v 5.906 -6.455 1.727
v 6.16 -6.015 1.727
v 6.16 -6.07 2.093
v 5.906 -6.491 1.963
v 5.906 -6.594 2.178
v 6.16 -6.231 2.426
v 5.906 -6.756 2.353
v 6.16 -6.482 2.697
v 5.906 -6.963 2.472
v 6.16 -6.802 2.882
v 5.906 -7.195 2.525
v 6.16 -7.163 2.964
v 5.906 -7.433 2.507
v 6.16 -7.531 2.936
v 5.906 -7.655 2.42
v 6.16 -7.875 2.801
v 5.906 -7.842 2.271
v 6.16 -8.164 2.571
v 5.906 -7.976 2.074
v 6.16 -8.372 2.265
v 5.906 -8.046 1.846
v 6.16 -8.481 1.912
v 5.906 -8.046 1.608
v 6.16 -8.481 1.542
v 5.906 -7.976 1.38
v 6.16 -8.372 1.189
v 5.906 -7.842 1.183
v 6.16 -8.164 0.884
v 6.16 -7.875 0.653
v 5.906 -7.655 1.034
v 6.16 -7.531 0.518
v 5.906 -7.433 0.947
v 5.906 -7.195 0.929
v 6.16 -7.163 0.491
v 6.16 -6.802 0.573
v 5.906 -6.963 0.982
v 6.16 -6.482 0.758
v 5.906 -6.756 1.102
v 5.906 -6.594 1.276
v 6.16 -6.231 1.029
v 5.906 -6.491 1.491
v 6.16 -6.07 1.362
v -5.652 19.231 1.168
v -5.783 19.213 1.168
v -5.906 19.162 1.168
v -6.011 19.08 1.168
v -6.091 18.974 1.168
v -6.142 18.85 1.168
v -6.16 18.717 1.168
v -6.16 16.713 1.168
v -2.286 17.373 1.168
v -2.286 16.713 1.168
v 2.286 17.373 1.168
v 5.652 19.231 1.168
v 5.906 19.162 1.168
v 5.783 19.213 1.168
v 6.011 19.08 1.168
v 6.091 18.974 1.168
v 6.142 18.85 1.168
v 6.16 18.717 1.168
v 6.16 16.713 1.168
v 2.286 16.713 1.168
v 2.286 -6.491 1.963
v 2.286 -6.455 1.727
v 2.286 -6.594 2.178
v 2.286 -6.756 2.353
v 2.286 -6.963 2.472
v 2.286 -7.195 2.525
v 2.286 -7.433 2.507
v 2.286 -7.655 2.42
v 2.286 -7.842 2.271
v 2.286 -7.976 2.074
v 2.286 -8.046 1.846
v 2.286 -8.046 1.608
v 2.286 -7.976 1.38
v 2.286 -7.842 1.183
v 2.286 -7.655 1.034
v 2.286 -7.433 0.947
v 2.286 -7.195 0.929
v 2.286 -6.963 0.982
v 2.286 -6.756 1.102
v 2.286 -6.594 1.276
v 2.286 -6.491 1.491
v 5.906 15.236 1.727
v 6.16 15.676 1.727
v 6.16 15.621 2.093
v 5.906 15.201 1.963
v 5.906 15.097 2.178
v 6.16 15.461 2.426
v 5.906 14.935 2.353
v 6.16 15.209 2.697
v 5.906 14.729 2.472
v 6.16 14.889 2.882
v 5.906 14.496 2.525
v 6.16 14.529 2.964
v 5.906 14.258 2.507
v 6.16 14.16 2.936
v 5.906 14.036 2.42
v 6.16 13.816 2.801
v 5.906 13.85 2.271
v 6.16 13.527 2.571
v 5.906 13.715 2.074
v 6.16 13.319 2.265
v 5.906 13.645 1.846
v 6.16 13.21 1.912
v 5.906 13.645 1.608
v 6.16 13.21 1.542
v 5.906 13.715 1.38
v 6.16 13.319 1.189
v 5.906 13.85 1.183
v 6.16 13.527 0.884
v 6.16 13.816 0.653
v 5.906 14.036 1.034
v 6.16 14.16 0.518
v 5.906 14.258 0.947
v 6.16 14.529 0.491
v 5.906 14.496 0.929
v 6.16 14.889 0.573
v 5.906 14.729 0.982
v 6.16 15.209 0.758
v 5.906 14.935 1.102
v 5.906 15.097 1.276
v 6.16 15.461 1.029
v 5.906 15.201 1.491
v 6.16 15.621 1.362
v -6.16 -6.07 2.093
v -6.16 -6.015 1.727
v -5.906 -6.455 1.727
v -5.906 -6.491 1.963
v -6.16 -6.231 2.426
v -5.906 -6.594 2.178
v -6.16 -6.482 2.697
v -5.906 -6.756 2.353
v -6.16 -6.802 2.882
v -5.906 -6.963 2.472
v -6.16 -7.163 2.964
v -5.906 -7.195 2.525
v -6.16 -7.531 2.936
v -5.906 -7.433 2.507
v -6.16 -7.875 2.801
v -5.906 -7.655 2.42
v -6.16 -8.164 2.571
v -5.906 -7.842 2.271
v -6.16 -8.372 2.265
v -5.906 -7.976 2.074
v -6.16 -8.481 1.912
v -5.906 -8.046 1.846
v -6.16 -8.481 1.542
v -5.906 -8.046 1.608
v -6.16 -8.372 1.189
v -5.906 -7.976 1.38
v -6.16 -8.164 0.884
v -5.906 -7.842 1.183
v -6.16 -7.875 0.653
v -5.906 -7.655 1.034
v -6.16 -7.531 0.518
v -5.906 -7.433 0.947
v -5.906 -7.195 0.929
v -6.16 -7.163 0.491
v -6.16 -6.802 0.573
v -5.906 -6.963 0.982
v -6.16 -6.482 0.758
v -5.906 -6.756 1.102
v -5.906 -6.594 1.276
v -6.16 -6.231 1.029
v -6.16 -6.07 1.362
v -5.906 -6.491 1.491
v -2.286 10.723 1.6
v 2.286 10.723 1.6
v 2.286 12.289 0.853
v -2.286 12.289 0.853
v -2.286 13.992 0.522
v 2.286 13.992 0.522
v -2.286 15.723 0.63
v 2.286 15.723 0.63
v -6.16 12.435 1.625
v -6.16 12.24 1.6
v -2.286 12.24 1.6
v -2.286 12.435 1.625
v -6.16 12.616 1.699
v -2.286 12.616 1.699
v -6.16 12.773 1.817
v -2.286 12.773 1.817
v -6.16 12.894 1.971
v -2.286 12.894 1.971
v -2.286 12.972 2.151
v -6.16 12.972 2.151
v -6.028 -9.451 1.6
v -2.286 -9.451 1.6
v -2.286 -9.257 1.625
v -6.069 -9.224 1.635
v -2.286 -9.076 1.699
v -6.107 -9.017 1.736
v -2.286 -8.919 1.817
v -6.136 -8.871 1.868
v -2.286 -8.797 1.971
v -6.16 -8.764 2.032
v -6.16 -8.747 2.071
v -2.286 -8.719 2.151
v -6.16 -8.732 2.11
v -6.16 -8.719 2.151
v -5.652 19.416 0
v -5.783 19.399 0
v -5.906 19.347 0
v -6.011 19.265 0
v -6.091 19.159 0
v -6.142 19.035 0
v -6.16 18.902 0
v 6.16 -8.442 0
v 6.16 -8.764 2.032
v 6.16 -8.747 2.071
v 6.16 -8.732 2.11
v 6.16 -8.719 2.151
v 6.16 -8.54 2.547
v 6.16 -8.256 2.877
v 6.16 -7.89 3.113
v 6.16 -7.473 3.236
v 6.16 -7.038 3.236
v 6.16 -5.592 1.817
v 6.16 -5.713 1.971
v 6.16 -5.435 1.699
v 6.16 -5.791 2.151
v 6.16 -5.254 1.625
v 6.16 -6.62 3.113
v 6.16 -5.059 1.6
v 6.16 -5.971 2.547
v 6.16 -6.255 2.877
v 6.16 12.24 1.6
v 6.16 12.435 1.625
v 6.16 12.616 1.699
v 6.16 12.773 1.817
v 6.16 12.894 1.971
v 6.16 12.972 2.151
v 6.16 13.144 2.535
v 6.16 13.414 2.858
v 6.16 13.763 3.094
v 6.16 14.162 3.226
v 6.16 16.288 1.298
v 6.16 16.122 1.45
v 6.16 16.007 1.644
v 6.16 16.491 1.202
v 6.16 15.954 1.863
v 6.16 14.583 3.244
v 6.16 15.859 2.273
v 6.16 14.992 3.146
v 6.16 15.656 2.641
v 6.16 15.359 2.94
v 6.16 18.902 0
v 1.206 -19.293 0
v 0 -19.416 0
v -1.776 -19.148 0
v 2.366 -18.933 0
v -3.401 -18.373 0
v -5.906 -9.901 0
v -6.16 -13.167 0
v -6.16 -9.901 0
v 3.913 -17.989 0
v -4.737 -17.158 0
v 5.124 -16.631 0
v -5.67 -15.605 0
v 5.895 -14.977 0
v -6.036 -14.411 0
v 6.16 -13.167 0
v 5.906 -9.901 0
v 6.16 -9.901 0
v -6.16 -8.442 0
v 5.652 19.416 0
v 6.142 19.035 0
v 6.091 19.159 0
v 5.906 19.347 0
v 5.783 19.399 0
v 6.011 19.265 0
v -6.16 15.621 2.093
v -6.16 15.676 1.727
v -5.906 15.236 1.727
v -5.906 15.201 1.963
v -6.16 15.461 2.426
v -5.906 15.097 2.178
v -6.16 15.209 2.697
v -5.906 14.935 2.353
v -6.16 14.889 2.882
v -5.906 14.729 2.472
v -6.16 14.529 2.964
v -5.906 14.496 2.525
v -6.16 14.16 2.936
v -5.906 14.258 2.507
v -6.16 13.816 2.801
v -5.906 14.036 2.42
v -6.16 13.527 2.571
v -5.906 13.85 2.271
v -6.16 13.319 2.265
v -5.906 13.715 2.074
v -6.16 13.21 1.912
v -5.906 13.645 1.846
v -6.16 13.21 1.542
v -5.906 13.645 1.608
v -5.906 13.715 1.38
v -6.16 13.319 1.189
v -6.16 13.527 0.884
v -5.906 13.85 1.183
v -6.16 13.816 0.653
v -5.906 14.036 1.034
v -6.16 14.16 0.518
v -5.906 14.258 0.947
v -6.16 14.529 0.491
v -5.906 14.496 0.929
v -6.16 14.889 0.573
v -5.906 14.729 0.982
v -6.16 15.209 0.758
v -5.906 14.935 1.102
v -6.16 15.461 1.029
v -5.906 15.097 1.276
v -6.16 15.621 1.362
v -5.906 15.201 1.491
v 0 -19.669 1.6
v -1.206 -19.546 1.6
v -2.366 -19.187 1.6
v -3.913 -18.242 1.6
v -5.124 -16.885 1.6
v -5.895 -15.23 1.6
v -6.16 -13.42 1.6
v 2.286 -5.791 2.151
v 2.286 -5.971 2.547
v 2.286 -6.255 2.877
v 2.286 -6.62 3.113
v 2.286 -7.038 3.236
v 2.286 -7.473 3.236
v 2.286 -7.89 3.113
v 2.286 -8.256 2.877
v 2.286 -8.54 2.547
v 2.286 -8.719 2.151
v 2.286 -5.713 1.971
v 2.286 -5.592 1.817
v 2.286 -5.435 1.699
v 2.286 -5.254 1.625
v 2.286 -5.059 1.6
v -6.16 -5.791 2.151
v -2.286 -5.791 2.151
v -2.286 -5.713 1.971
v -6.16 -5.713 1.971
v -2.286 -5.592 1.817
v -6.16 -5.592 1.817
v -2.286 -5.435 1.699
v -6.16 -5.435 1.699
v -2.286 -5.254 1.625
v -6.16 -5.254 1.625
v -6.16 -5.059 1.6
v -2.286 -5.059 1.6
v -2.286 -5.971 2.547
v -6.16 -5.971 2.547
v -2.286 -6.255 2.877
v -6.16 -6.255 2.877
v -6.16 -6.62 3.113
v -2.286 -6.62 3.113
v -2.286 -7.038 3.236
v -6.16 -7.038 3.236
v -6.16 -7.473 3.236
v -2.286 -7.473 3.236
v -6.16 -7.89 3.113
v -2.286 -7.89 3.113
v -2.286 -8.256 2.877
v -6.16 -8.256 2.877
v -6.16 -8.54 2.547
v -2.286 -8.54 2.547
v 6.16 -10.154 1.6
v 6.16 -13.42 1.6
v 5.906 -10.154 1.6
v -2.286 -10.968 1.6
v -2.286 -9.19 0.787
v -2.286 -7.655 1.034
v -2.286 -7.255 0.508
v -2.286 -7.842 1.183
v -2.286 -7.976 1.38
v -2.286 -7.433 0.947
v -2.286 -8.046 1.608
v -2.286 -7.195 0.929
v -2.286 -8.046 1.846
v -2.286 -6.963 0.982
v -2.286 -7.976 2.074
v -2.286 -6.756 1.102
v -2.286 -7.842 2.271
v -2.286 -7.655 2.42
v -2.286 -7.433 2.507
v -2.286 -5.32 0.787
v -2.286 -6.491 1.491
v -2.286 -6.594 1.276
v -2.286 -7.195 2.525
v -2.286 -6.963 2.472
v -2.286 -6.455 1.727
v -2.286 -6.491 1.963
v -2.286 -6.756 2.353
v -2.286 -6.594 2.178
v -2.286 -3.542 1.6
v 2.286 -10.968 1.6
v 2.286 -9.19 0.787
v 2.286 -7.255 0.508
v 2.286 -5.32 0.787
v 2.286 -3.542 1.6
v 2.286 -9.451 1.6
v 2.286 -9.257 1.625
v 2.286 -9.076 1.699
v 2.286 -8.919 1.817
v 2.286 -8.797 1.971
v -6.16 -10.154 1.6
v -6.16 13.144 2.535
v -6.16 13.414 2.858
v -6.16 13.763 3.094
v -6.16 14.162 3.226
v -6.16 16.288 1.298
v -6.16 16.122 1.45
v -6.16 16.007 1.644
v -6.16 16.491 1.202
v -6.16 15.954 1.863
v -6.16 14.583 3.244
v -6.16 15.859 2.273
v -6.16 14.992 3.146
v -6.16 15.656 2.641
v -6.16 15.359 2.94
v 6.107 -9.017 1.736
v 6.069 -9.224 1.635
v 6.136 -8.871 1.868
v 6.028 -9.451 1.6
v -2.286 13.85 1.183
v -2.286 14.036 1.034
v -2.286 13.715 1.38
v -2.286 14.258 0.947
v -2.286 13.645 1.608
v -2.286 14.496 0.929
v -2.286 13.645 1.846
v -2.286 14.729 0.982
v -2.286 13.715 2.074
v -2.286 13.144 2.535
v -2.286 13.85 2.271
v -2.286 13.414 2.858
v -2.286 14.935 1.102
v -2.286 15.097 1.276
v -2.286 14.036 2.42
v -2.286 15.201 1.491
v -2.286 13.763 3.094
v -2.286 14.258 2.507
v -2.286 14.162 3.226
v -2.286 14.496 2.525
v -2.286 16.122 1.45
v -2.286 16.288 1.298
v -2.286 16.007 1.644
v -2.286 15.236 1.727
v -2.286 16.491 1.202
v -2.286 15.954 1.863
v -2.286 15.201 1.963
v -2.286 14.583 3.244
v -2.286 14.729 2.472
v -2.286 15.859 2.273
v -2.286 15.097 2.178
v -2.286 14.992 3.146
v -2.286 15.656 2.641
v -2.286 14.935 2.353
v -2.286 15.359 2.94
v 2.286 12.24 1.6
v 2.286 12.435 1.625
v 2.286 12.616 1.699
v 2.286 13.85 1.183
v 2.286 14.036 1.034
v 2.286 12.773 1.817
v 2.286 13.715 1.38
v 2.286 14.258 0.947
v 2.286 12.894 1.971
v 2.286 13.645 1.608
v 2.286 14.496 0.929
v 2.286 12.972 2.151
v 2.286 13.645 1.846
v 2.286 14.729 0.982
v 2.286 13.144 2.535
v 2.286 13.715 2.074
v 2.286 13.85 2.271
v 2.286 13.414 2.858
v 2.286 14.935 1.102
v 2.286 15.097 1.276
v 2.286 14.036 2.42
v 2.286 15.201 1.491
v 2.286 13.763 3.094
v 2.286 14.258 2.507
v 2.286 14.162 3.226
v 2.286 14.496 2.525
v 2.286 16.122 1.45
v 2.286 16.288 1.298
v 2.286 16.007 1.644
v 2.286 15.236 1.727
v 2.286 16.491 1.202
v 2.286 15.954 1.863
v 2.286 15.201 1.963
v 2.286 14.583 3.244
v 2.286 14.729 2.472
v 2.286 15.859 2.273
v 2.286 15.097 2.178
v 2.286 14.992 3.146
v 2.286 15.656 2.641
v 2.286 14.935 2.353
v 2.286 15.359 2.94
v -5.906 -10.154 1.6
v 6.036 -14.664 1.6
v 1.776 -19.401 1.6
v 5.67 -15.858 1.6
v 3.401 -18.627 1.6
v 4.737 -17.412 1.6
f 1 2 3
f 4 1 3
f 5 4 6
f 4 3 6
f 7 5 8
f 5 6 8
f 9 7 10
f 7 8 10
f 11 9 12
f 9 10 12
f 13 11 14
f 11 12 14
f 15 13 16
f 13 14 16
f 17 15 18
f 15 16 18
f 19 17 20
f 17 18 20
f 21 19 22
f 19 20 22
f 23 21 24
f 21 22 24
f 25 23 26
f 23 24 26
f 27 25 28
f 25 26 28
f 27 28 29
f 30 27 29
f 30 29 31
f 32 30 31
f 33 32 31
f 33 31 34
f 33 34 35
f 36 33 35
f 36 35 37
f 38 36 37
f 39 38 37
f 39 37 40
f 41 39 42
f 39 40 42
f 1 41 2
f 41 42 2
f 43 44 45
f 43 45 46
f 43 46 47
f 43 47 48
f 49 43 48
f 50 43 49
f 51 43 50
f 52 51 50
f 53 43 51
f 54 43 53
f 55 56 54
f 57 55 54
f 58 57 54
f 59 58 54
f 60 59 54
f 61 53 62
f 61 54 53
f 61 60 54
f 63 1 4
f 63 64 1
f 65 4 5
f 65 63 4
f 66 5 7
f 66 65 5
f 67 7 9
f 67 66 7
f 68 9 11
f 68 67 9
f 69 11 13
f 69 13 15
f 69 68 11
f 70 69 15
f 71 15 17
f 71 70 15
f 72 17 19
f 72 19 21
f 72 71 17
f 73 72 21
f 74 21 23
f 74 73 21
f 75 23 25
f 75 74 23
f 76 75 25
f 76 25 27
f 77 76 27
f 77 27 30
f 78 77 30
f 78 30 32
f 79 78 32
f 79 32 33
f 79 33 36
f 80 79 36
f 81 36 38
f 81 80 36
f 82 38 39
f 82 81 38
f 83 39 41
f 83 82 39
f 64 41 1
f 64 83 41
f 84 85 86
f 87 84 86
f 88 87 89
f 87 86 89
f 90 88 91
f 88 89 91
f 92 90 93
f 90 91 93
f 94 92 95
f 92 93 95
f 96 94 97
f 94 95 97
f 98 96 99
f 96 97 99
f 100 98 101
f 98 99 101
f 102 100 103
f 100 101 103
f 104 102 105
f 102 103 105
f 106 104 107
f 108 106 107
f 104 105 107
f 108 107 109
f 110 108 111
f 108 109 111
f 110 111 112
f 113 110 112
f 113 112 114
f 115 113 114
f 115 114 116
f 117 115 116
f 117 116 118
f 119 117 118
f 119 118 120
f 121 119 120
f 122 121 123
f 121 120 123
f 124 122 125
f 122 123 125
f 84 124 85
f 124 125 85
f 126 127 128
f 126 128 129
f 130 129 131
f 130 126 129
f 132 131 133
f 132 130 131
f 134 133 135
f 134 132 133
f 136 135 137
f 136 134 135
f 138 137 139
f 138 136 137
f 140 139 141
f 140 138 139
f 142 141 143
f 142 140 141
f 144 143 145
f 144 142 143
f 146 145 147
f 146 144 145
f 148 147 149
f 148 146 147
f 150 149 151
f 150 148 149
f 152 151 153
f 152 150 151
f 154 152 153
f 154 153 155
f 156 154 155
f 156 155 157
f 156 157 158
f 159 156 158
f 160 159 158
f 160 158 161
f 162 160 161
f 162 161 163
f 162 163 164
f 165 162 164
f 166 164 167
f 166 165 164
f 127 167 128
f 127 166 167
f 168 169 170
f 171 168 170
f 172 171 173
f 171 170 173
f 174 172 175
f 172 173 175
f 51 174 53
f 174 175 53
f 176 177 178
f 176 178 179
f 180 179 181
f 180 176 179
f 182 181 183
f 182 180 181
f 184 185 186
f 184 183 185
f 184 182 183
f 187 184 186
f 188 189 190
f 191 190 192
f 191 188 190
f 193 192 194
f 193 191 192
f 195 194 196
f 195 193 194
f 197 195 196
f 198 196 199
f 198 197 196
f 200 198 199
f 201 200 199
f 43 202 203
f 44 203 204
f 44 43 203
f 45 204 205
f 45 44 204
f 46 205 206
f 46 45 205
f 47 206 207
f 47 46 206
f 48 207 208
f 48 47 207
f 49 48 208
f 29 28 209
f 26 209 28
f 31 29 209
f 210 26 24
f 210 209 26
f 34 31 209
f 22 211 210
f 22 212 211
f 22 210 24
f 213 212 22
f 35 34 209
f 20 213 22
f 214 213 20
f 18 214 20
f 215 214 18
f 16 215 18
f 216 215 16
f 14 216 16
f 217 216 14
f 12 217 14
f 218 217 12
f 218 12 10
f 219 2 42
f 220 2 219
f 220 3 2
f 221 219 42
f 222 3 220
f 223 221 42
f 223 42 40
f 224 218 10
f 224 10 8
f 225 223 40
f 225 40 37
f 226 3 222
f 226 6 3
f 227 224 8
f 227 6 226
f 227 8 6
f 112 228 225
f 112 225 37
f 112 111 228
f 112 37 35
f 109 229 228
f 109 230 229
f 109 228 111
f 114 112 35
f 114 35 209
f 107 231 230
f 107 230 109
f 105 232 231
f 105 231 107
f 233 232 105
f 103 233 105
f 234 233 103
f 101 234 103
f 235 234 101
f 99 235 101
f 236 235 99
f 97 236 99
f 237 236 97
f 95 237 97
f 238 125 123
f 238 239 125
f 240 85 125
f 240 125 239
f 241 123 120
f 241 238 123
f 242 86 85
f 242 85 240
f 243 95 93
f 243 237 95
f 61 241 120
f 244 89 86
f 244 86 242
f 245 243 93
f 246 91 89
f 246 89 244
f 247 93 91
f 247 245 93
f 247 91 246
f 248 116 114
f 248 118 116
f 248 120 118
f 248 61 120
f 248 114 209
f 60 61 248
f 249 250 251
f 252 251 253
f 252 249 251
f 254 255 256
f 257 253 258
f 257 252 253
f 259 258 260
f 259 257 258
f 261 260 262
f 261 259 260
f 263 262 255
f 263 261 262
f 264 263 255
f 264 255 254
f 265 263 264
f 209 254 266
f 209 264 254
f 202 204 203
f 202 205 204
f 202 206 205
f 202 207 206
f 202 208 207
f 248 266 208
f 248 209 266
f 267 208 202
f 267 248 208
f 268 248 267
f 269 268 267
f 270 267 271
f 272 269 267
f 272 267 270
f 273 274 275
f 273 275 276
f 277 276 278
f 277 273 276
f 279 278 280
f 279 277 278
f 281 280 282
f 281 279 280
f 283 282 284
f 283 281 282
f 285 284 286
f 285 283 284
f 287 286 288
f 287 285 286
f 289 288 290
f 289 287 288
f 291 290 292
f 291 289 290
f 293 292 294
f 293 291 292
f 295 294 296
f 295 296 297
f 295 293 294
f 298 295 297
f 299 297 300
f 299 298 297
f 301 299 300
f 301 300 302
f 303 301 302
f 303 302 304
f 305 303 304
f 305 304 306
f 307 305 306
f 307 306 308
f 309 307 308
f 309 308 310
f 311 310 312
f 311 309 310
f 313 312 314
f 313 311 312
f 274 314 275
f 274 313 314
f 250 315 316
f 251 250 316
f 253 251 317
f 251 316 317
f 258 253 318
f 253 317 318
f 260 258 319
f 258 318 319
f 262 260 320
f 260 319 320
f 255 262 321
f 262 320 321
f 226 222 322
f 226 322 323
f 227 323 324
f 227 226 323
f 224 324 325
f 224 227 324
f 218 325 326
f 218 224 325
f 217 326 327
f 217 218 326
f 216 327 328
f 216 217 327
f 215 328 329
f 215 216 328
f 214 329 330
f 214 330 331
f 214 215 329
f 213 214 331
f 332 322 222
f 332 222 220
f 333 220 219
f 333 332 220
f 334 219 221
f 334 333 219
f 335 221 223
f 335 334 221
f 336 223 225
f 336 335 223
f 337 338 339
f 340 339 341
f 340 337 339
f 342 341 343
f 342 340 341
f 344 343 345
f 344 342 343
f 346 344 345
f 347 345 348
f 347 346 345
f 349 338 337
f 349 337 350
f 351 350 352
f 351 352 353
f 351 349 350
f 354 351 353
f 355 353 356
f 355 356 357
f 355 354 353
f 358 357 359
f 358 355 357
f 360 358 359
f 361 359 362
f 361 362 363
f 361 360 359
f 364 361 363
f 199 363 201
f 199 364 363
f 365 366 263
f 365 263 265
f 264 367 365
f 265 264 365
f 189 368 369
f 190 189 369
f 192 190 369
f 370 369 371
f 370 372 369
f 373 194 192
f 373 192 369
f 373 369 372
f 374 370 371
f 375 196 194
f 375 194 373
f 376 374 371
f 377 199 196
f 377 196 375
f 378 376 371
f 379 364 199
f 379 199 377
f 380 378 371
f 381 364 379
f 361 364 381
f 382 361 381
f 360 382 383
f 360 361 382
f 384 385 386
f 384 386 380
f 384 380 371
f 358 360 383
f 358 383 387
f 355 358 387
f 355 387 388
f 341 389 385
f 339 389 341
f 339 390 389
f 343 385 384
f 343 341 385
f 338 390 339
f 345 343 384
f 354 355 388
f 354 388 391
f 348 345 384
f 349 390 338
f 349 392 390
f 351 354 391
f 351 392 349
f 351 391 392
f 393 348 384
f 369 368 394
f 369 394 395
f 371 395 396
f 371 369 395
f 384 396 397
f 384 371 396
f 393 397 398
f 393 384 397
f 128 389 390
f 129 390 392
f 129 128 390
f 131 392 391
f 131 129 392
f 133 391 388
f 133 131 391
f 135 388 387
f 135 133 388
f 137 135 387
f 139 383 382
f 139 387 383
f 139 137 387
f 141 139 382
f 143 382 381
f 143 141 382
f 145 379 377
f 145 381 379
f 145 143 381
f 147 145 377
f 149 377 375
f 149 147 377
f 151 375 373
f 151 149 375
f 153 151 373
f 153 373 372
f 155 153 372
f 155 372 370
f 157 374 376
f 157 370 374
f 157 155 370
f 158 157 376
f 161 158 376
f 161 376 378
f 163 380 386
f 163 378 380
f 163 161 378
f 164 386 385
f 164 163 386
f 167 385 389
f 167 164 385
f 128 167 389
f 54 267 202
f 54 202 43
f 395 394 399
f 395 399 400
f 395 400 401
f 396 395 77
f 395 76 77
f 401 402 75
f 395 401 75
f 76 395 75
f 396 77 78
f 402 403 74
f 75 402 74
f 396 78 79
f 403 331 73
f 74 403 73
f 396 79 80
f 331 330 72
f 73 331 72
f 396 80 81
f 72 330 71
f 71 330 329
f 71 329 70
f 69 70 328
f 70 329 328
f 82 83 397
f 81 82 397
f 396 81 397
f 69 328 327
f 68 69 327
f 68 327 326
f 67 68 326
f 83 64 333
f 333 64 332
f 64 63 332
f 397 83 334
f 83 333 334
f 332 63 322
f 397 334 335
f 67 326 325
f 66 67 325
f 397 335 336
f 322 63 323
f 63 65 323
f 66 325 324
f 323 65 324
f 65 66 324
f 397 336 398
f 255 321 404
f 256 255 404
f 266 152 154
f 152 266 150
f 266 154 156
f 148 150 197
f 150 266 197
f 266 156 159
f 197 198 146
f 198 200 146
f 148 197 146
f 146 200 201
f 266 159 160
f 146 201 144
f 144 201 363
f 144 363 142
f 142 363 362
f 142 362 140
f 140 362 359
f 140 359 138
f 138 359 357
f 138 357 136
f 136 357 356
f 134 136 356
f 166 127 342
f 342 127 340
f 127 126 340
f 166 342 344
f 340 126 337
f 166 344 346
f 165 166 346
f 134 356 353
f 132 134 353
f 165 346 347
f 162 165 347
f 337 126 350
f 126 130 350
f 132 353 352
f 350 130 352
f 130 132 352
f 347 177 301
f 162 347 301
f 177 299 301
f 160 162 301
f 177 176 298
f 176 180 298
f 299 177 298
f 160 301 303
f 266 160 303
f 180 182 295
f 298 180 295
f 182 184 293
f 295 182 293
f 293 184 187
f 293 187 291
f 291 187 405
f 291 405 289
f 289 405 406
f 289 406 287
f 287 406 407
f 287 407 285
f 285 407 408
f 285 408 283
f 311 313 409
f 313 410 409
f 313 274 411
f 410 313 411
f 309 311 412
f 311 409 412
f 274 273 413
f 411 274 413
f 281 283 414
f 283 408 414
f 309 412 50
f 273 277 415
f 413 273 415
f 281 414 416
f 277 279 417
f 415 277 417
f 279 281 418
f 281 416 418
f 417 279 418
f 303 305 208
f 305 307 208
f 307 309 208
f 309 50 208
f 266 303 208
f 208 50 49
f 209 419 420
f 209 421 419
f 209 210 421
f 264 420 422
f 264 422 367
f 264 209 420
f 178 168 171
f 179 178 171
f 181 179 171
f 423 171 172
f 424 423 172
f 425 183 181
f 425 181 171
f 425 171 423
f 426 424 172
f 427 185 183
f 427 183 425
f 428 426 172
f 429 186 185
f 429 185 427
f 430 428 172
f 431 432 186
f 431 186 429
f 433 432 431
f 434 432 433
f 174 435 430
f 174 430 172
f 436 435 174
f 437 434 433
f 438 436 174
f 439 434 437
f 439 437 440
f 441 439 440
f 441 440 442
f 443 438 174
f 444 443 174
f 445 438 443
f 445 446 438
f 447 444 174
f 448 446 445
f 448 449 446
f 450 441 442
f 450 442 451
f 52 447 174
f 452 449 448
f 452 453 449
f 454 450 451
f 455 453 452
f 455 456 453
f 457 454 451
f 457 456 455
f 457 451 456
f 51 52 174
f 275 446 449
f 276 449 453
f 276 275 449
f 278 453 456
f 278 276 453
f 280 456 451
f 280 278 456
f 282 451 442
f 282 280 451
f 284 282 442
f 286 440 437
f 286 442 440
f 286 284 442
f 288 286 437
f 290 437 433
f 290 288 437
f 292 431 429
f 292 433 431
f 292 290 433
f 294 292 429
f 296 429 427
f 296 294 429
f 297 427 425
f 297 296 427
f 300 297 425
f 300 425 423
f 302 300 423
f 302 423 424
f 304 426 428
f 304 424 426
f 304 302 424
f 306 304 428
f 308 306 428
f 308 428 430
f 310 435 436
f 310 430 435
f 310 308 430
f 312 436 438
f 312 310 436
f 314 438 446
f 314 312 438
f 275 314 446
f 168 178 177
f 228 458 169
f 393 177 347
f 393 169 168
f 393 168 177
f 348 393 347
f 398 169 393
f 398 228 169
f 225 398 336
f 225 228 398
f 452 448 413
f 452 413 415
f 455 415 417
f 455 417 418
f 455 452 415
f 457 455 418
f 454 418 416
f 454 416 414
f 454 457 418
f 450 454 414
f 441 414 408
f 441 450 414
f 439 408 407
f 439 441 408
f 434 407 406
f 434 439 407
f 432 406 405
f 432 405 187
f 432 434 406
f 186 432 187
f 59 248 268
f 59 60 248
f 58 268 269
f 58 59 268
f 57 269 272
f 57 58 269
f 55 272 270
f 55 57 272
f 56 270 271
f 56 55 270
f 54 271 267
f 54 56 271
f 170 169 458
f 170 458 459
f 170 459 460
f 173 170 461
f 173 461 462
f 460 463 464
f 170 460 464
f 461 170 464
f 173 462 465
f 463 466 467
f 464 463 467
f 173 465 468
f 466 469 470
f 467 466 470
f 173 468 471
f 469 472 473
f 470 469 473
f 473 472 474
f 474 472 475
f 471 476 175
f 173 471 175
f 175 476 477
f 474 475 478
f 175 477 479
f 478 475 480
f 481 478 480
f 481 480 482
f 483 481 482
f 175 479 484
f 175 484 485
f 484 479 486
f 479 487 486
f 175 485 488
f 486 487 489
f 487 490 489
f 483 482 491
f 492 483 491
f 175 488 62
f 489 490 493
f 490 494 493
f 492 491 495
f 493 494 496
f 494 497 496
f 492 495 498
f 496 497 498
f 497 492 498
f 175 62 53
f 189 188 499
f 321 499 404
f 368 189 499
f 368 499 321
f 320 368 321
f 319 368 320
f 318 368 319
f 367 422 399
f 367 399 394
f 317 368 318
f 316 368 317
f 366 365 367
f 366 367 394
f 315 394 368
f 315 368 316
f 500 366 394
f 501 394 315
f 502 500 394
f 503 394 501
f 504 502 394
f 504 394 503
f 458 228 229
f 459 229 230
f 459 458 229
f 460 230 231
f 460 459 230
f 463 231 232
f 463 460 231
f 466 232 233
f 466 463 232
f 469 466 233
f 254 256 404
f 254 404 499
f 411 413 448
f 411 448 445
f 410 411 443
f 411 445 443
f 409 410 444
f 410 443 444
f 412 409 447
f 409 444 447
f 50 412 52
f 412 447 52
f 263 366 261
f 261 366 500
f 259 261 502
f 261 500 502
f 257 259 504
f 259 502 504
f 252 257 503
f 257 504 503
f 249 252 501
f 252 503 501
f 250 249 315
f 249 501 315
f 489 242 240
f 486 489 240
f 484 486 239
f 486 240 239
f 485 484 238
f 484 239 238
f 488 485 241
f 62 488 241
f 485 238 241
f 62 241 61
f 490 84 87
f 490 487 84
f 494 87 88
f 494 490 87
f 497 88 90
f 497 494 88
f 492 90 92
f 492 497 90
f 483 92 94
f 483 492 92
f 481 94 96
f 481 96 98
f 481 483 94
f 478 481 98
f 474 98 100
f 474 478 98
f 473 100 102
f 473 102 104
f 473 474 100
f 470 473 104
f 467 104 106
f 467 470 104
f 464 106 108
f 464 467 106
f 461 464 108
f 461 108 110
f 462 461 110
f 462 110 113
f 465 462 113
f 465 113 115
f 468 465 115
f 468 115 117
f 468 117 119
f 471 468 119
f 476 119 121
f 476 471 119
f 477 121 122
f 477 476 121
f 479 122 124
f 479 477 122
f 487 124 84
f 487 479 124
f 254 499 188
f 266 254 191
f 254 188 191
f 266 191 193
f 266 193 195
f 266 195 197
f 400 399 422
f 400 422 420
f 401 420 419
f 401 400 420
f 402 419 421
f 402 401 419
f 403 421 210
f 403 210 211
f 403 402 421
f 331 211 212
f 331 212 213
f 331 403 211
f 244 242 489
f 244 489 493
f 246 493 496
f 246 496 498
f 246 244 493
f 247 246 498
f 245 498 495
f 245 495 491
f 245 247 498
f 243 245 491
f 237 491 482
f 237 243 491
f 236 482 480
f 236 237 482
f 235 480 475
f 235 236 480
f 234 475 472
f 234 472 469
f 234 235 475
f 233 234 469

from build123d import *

# Parameters (mm, degrees)
F0_R        = 0.8001
F1_DEPTH    = 6.1595
F2_R        = 0.762
F3_SIZE2    = 0.4399409051
F3_SIZE     = 0.254
F3_2_SIZE2  = 0.4399409051
F3_2_SIZE   = 0.254
F4_SIZE2    = 0.4399409051
F4_SIZE     = 0.254
F6_DEPTH    = 2.286
F8_R        = 0.508
F9_T1_DEPTH = 32.4811466943
F11_DEPTH   = 12.7


# Not quite as in the source:
# - a fillet or chamfer that OpenCascade refuses, or shapes differently, is made with other operations: its cross-section is extruded or revolved along the edge and cut away or added


with BuildPart() as f1:
    # F0 (on Right) → F1 (new body, symmetric)
    with BuildSketch(Plane.YZ):
        with BuildLine():
            Line((-19.6694904986, 1.6002), (-19.4160437172, 0))
            Line((-19.4160437172, 0), (19.4160437172, 0))
            Line((19.4160437172, 0), (19.2309873372, 1.1684))
            Line((19.2309873372, 1.1684), (15.8541987451, 1.1684))
            ThreePointArc((15.8541987451, 1.1684), (14.6580511896, 3.2349867583), (12.9176425998, 1.6002))
            Line((12.9176425998, 1.6002), (-5.7365591714, 1.6002))
            ThreePointArc((-5.7365591714, 1.6002), (-7.2552582858, 3.2512), (-8.7739574002, 1.6002))
            Line((-8.7739574002, 1.6002), (-19.6694904986, 1.6002))
        make_face()
        with Locations((-7.2552582858, 1.7272)):
            Circle(F0_R, mode=Mode.SUBTRACT)
        with Locations((14.4363417142, 1.7272)):
            Circle(F0_R, mode=Mode.SUBTRACT)
    extrude(amount=F1_DEPTH, both=True)

    # F2
    f2_edges = [f1.edges().sort_by_distance(p)[0] for p in [
        (0, -8.773957, 1.6002),
        (0, -5.736559, 1.6002),
        (0, 12.917643, 1.6002),
        (0, 15.854199, 1.1684),
    ]]
    fillet(f2_edges, radius=F2_R)

    # F3
    f3_edges = [f1.edges().sort_by_distance(p)[0] for p in [
        (6.1595, -8.055358, 1.7272),
        (-6.1595, -8.055358, 1.7272),
    ]]
    f3_side = f1.faces().sort_by_distance((0, -8.055358, 1.7272))[0]
    chamfer(f3_edges, length=F3_SIZE, length2=F3_SIZE2, reference=f3_side)

    # F3#2
    f3_2_edges = [f1.edges().sort_by_distance(p)[0] for p in [
        (6.1595, 13.636242, 1.7272),
    ]]
    f3_2_side = f1.faces().sort_by_distance((0, 13.636242, 1.7272))[0]
    chamfer(f3_2_edges, length=F3_2_SIZE, length2=F3_2_SIZE2, reference=f3_2_side)

    # F4
    f4_edges = [f1.edges().sort_by_distance(p)[0] for p in [
        (-6.1595, 13.636242, 1.7272),
    ]]
    f4_side = f1.faces().sort_by_distance((-0.127, 13.636242, 1.7272))[0]
    chamfer(f4_edges, length=F4_SIZE, length2=F4_SIZE2, reference=f4_side)

    # F5 (on Right) → F6 (cut, symmetric)
    with BuildSketch(Plane.YZ):
        with BuildLine():
            Line((-1.4272936791, 3.7511704683), (-13.4970735674, 4.5248900073))
            ThreePointArc((-13.4970735674, 4.5248900073), (-7.6939820902, 0.5220475291), (-1.4272936791, 3.7511704683))
        make_face()
        with BuildLine():
            Line((20.2263604549, 3.6906977019), (8.6020119823, 3.7614527913))
            ThreePointArc((8.6020119823, 3.7614527913), (14.3945992101, 0.508127038), (20.2263604549, 3.6906977019))
        make_face()
    extrude(amount=F6_DEPTH, both=True, mode=Mode.SUBTRACT)

    # F8
    f8_edges = [f1.edges().sort_by_distance(p)[0] for p in [
        (6.1595, 19.323516, 0.5842),
        (-6.1595, 19.323516, 0.5842),
    ]]
    fillet(f8_edges, radius=F8_R)

    # F9: fillet of radius 6.1722 on 2 edges, made by hand

    # F9_s2 → F9_t1 (cut)
    with BuildSketch(Plane(origin=(0, -3.1424532039, 19.8406686756), x_dir=(1, 0, 0), z_dir=(0, 0.156434465, -0.9876883406))):
        with BuildLine():
            ThreePointArc((6.1595, 13.0048), (4.3517044748, 17.3692044748), (-0.0127, 19.177))
            Line((-0.0127, 19.177), (6.1595, 19.177))
            Line((6.1595, 19.177), (6.1595, 13.0048))
        make_face()
        with BuildLine():
            ThreePointArc((0.0127, 19.177), (-4.3517044748, 17.3692044748), (-6.1595, 13.0048))
            Line((-6.1595, 13.0048), (-6.1595, 19.177))
            Line((-6.1595, 19.177), (0.0127, 19.177))
        make_face()
    extrude(amount=F9_T1_DEPTH, mode=Mode.SUBTRACT)

    # F10 (on line) → F11 (cut, symmetric)
    with BuildSketch(Plane(origin=(0, -0.4444158842, 2.8059314619), x_dir=(1, 0, 0), z_dir=(0, -0.156434465, 0.9876883406))):
        Polygon((5.9055, -9.7789869341), (6.1595, -9.7789869341), (6.1595, -8.338481352), align=None)
        Polygon((-6.1595, -8.338481352), (-6.1595, -9.7789869341), (-5.9055, -9.7789869341), align=None)
    extrude(amount=F11_DEPTH, both=True, mode=Mode.SUBTRACT)


solid = f1.part
